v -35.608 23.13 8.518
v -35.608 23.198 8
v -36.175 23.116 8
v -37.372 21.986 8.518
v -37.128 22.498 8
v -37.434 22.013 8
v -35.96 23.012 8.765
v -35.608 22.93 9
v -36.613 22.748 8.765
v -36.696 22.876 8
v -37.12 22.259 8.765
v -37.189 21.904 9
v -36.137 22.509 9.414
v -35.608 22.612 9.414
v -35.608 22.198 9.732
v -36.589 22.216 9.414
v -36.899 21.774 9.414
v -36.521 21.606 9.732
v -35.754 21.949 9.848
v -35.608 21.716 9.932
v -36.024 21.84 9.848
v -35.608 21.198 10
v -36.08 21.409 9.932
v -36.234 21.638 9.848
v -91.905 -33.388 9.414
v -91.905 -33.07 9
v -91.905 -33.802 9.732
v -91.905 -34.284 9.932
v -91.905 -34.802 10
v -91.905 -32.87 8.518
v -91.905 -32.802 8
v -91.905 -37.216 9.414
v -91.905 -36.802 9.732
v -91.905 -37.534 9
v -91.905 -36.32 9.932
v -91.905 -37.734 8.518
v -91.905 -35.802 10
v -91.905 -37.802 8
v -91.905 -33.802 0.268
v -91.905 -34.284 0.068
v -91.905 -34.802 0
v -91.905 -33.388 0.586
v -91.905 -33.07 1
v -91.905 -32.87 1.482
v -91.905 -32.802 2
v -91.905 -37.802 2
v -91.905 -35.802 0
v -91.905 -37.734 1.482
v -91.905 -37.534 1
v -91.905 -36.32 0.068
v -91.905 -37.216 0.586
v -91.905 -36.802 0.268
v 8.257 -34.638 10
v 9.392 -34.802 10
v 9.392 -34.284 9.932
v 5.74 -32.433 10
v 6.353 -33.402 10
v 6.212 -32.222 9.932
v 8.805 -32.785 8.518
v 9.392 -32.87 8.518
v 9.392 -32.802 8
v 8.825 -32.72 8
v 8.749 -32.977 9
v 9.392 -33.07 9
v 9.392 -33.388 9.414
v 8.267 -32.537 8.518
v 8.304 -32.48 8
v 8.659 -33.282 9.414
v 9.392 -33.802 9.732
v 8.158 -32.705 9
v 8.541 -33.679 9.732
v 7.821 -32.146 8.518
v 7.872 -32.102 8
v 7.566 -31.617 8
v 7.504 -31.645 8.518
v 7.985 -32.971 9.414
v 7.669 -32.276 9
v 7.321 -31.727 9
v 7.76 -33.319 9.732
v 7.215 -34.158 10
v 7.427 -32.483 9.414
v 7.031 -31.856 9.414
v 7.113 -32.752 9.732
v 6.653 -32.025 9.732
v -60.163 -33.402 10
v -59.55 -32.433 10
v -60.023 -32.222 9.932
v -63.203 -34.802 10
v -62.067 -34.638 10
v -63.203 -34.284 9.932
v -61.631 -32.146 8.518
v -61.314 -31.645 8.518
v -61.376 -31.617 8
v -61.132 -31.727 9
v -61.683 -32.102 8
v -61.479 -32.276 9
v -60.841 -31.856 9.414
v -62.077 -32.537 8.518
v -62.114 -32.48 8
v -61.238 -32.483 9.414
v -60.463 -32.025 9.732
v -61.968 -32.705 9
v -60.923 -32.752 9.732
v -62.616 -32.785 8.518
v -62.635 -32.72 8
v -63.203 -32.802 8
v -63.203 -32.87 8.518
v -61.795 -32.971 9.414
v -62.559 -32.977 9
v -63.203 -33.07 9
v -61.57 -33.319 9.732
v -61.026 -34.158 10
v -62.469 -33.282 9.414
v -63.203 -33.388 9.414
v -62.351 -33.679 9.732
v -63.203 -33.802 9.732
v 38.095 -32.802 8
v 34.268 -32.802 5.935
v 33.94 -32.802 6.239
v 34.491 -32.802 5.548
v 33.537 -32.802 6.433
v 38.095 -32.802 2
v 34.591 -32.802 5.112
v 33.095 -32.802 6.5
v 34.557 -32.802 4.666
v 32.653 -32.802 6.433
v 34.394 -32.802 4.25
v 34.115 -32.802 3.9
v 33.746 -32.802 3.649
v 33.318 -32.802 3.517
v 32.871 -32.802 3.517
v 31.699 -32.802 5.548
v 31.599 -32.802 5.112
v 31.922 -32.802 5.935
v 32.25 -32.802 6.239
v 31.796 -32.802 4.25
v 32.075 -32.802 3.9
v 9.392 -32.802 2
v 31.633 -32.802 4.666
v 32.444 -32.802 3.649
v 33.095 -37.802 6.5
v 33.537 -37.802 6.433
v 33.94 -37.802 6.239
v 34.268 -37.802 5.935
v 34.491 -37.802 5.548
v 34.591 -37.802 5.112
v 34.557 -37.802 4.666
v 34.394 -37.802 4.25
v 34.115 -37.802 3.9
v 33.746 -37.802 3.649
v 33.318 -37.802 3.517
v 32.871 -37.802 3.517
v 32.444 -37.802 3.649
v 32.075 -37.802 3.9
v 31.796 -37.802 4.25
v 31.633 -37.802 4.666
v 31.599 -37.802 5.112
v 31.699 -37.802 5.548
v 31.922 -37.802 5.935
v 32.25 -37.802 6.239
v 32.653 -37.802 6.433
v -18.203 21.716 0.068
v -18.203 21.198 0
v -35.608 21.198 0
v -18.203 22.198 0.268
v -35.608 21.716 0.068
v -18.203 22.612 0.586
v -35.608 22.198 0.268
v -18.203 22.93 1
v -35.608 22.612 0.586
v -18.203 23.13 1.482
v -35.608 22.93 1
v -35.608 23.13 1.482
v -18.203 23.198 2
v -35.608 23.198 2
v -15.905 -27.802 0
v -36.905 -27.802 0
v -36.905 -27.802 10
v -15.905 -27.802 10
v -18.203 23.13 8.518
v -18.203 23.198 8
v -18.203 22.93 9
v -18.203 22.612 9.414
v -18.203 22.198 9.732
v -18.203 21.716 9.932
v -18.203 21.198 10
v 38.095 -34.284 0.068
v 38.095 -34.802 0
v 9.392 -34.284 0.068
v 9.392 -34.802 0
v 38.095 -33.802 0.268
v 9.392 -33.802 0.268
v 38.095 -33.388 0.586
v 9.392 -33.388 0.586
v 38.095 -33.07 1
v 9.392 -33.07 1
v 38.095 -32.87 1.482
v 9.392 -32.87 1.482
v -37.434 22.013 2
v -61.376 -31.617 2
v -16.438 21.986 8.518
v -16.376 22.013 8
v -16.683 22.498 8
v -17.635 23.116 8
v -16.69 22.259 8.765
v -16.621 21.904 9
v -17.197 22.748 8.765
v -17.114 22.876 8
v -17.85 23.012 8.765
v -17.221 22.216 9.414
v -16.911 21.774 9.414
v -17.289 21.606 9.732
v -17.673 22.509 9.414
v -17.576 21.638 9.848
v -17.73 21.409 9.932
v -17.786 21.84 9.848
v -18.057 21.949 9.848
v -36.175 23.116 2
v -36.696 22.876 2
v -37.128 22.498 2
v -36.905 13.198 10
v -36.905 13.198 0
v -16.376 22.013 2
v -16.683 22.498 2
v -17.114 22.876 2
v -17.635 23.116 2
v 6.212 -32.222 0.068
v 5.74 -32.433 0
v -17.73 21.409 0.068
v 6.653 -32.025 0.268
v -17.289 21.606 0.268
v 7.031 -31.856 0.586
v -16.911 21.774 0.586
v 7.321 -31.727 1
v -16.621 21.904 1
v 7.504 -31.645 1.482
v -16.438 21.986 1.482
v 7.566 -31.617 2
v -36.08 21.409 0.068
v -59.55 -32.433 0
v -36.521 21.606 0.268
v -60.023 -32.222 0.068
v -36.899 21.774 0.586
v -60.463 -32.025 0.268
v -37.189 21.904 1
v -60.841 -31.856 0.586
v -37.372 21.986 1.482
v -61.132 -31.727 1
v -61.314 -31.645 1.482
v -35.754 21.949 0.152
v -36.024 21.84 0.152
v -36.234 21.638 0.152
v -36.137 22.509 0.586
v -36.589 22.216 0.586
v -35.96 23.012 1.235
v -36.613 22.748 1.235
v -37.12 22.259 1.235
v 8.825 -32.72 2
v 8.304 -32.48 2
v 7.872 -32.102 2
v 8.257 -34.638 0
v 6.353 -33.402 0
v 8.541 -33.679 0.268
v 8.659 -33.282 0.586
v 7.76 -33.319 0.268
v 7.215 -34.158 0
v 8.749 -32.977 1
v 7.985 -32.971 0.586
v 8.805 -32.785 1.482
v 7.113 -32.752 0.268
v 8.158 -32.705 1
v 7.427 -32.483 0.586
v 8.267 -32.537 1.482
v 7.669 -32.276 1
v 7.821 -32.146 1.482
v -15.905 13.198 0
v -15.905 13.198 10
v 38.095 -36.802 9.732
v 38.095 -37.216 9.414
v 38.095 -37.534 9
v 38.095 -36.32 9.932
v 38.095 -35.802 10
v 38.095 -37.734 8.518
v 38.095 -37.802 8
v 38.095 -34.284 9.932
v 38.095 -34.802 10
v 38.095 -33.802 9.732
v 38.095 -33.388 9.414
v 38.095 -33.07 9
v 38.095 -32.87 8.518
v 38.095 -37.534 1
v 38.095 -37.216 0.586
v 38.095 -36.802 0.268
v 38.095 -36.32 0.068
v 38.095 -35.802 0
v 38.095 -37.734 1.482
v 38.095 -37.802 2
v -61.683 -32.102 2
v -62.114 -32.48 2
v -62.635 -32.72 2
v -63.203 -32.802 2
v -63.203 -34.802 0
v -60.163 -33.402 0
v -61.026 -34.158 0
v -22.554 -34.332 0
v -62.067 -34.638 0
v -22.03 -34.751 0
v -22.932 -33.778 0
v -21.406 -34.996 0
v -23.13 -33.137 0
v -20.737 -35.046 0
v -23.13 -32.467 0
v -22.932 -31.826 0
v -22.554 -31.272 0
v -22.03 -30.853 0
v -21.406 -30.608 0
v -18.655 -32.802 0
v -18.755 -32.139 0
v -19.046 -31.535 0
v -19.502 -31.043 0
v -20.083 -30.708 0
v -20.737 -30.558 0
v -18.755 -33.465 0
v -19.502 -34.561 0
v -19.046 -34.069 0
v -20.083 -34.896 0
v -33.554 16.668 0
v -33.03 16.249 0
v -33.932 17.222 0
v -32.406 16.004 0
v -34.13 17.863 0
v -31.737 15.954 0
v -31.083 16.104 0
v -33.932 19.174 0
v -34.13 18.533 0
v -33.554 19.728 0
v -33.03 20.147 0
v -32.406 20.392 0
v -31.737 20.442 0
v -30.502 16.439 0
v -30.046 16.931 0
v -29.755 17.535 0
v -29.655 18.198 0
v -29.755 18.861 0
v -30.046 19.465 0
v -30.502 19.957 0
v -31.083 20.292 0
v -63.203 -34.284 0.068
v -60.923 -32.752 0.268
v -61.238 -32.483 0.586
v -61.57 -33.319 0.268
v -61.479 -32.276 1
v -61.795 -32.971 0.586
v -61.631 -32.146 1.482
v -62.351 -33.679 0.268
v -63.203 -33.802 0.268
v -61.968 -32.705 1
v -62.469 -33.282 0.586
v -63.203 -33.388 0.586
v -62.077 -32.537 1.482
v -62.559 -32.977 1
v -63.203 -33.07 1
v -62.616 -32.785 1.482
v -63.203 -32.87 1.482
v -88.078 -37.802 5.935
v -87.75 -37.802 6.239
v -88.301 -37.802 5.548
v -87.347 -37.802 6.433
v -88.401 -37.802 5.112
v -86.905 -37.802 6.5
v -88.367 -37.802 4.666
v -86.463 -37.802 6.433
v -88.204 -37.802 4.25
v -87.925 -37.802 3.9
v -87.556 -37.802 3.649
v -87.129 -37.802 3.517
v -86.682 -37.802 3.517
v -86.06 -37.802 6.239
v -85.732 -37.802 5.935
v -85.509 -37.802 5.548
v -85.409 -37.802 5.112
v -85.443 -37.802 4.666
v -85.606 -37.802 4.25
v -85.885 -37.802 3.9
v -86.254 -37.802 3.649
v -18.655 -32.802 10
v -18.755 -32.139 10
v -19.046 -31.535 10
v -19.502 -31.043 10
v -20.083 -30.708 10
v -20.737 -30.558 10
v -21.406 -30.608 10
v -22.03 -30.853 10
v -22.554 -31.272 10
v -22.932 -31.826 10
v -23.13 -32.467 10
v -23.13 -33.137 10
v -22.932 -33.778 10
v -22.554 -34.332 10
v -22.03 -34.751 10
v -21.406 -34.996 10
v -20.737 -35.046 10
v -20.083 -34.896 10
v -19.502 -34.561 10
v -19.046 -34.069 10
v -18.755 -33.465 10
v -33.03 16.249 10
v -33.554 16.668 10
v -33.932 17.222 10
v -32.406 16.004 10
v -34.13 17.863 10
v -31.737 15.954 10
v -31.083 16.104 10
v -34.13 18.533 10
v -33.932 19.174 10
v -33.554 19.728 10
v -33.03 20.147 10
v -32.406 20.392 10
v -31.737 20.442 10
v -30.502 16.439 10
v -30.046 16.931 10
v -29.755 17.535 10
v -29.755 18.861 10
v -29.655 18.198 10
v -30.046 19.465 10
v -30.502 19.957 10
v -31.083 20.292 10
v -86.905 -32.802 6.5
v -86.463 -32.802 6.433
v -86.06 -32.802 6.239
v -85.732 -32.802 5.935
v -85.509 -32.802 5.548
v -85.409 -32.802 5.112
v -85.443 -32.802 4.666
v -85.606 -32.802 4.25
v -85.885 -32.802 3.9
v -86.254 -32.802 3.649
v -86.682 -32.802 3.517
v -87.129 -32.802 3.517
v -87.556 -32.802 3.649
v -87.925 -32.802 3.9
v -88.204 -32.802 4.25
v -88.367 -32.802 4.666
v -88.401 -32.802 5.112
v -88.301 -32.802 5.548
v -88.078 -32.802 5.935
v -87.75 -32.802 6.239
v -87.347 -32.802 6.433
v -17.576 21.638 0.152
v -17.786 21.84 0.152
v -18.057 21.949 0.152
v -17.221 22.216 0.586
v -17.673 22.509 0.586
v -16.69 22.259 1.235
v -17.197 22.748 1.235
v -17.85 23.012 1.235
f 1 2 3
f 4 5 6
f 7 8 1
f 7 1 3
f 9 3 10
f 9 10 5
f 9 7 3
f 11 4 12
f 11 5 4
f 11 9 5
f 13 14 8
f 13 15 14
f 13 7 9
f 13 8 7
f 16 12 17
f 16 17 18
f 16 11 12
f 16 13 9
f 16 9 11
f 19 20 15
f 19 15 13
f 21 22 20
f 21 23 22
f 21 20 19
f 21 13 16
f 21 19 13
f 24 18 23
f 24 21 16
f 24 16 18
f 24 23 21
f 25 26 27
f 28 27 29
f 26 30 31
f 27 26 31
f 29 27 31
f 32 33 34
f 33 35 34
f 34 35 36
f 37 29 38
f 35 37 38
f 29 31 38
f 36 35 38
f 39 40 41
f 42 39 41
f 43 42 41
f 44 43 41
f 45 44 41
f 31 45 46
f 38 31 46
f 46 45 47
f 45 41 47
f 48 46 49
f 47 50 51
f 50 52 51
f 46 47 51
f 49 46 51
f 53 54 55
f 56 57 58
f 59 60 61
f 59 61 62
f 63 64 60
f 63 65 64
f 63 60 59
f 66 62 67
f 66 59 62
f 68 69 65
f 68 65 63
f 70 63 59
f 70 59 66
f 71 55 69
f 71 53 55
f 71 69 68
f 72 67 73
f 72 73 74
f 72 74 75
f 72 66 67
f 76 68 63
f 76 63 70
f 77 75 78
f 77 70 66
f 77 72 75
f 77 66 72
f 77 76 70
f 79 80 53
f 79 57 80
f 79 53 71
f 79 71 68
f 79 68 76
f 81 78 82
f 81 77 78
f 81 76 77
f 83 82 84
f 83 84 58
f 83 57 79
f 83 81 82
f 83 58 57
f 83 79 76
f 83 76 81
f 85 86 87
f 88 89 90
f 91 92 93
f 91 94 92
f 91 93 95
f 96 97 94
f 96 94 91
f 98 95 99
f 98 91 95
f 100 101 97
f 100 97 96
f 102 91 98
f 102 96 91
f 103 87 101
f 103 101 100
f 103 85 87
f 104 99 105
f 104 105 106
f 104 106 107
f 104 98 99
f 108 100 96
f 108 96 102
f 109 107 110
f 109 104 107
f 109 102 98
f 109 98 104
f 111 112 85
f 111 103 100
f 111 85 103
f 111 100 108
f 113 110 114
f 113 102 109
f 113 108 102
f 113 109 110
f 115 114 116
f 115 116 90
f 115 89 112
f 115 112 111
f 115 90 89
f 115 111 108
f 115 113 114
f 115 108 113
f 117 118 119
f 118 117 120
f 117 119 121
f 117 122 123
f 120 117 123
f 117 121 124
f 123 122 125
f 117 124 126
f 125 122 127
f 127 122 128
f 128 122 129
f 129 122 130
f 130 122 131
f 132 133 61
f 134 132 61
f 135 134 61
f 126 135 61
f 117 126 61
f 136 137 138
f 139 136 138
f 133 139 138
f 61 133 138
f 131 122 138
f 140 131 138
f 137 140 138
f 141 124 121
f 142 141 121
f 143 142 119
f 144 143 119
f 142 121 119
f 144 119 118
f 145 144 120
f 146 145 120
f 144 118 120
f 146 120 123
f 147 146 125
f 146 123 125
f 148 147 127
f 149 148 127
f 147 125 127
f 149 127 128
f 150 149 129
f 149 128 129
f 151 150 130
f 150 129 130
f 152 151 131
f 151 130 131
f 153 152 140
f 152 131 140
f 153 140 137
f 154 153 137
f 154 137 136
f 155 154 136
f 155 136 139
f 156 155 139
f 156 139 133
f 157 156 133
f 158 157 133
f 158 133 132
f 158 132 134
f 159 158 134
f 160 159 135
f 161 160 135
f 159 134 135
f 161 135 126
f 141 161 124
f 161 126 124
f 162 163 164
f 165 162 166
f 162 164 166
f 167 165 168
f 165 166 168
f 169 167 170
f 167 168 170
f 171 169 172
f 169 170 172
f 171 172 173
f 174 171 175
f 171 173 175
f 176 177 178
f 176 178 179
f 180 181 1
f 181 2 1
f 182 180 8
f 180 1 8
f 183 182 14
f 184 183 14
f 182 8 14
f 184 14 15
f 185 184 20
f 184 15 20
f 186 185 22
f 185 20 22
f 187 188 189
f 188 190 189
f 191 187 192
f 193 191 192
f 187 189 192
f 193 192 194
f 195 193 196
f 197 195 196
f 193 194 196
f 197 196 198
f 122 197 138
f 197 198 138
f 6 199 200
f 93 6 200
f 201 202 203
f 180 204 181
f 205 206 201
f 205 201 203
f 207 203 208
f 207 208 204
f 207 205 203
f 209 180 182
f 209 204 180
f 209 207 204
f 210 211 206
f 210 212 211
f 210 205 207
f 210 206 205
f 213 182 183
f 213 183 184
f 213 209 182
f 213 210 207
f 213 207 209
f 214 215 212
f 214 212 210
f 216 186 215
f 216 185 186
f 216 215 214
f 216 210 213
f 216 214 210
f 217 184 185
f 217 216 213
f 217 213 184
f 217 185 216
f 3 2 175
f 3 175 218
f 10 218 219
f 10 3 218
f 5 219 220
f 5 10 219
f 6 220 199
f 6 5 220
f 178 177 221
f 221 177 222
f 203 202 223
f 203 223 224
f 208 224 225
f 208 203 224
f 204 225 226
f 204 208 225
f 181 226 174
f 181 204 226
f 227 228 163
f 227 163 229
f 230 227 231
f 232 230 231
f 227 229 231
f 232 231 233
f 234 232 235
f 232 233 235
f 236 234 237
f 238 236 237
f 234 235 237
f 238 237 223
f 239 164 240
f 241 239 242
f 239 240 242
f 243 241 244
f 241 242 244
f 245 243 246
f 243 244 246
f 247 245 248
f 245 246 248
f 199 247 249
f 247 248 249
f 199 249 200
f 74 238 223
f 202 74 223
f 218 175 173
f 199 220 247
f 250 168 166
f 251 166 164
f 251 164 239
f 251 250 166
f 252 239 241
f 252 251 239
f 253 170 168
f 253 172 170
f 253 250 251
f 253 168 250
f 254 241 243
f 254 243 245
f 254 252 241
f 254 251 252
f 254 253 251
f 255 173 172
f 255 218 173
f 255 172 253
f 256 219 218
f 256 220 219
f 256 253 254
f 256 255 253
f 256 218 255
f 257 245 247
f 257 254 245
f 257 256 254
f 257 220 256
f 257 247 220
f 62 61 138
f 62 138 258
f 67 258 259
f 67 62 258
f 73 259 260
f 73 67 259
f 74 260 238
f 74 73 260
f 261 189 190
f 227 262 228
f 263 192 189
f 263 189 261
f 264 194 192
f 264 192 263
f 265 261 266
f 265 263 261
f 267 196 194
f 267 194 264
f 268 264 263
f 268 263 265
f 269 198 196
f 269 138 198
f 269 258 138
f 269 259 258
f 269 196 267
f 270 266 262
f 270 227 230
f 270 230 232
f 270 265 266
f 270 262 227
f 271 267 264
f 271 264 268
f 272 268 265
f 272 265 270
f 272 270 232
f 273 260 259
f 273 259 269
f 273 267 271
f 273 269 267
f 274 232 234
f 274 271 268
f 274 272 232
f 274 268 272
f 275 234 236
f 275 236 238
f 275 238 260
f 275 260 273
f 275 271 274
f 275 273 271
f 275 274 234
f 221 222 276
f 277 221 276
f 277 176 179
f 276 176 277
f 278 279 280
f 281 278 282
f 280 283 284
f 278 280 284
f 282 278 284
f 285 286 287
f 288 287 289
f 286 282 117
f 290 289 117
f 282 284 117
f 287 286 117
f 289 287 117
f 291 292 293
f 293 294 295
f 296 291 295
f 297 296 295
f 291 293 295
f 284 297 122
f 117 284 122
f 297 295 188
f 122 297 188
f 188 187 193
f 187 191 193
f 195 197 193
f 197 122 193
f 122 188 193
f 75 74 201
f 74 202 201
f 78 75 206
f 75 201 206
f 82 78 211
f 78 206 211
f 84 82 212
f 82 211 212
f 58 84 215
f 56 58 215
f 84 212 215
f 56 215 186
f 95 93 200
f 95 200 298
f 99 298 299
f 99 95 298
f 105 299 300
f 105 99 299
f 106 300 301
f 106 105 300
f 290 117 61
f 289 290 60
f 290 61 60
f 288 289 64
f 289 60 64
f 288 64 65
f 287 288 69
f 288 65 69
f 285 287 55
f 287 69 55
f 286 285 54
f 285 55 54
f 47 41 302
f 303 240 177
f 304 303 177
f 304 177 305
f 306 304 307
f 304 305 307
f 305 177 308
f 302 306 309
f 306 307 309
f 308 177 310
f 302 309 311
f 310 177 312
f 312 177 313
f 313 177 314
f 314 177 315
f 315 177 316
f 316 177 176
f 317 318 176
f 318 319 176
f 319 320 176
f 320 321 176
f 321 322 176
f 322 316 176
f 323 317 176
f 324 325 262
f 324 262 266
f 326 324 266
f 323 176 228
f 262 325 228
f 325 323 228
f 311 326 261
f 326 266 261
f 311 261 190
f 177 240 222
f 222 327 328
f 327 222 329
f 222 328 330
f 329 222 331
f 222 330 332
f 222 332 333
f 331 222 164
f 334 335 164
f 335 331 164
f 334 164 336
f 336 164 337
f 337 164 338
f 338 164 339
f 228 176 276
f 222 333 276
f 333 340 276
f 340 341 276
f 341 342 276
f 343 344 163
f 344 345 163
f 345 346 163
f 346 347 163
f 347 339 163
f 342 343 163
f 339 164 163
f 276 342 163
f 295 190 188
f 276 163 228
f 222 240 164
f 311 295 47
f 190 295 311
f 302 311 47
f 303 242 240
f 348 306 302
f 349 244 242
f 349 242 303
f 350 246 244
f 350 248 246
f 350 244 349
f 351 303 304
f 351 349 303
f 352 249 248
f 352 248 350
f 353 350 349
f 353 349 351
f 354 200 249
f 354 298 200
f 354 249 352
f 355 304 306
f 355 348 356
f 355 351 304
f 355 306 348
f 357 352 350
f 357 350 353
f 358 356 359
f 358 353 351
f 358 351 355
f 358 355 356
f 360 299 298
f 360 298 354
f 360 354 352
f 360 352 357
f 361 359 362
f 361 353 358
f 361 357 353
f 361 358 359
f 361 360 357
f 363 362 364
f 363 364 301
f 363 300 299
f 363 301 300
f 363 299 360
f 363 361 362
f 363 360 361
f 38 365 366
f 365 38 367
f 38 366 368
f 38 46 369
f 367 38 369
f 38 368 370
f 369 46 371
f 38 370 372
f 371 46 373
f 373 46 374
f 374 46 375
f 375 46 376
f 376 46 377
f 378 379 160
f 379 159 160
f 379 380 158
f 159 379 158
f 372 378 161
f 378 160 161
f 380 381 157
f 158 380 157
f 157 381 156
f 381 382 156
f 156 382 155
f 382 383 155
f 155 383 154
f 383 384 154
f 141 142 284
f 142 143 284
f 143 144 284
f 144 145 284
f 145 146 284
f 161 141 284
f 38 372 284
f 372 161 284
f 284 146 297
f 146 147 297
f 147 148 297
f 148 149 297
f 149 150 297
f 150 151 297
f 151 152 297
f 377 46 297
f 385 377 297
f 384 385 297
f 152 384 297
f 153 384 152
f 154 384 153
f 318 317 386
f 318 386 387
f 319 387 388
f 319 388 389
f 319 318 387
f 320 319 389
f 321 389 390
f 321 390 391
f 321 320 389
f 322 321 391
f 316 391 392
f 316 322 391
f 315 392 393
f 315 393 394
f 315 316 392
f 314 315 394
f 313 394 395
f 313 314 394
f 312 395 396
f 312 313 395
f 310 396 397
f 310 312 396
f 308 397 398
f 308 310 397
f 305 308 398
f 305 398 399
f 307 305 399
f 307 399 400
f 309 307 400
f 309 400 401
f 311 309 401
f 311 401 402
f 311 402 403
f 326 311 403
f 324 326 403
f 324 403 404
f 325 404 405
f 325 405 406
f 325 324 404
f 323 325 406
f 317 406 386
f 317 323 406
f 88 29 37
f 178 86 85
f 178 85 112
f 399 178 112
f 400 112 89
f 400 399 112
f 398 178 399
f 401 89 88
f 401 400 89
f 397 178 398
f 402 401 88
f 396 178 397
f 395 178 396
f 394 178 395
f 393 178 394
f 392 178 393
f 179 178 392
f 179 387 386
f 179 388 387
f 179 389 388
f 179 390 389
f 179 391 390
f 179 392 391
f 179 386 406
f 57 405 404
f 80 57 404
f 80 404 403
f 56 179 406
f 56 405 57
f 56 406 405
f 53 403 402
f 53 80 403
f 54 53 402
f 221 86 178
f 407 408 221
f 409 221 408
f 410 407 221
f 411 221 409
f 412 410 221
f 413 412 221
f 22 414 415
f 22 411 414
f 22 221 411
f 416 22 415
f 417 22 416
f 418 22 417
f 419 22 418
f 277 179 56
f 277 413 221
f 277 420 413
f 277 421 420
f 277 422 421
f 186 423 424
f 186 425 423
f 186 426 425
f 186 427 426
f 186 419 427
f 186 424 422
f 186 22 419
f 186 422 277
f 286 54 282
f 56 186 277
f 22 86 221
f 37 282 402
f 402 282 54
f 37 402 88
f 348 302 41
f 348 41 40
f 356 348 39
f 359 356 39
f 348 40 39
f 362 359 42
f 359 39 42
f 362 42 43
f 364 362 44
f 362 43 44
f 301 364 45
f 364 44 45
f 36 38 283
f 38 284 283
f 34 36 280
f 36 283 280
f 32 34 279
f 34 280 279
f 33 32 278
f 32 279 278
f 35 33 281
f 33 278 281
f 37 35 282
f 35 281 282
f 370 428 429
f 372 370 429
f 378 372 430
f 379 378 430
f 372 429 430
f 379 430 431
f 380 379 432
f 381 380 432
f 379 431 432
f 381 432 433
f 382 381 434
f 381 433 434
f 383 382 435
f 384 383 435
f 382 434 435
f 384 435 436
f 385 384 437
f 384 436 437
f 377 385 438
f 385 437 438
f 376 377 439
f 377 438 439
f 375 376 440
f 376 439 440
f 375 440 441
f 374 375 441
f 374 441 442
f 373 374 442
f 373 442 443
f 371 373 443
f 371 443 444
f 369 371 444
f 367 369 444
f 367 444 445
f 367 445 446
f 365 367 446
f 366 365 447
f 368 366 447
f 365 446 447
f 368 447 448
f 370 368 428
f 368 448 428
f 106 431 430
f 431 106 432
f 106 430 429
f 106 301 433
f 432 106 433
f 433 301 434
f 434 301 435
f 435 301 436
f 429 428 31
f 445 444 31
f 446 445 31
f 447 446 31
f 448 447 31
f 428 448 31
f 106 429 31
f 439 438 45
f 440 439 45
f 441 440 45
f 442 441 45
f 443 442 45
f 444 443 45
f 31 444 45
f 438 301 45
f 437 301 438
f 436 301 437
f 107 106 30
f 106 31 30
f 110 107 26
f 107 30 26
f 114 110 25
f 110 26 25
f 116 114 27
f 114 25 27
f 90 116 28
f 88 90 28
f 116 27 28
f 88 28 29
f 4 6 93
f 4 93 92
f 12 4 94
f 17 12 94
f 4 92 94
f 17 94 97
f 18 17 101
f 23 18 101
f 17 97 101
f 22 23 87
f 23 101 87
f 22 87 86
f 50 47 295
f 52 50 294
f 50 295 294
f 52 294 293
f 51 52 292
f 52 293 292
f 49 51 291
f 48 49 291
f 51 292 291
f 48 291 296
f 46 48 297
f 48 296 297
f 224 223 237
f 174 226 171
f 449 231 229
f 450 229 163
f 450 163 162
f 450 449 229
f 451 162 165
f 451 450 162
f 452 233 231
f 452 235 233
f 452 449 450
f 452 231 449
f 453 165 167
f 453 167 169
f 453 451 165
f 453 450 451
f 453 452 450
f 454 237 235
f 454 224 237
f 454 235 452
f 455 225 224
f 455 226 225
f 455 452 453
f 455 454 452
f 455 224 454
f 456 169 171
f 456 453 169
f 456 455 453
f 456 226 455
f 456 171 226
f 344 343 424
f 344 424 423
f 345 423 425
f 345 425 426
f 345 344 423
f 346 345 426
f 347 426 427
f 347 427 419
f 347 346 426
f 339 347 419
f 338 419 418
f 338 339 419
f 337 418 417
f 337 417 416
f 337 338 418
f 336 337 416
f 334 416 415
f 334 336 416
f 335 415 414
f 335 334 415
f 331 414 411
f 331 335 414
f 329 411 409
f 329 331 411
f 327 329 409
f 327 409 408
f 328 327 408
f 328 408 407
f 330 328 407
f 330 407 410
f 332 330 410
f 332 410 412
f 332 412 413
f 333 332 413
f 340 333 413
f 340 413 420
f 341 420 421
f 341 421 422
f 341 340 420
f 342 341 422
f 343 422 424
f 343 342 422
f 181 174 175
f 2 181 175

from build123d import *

# Parameters (mm, degrees)
SKETCH1_W           = 21
SKETCH1_H           = 41
BOSS_EXTRUDE1_DEPTH = 10
SKETCH1_3_R         = 2.25
CUT_EXTRUDE1_DEPTH  = 10
SKETCH2_R           = 1.5
CUT_EXTRUDE2_DEPTH  = 5
FILLET1_R           = 2
FILLET2_R           = 2


with BuildPart() as part:
    # Sketch1 → Boss-Extrude1 (new body)
    with BuildSketch(Plane.XY):
        Polygon((8.094892468, -32.802015288), (-16.905107532, 23.197984712), (-36.905107532, 23.197984712), (-61.905107532, -32.802015288), (-91.905107532, -32.802015288), (-91.905107532, -37.802015288), (38.094892468, -37.802015288), (38.094892468, -32.802015288), align=None)
        with Locations((-26.405107532, -7.302015288)):
            Rectangle(SKETCH1_W, SKETCH1_H, mode=Mode.SUBTRACT)
    extrude(amount=BOSS_EXTRUDE1_DEPTH)

    # Sketch1<3> → Cut-Extrude1 (cut)
    with BuildSketch(Plane.XY):
        with Locations((-31.905107532, 18.197984712)):
            Circle(SKETCH1_3_R)
        with Locations((-20.905107532, -32.802015288)):
            Circle(SKETCH1_3_R)
    extrude(amount=CUT_EXTRUDE1_DEPTH, mode=Mode.SUBTRACT)

    # Sketch2 → Cut-Extrude2 (cut)
    with BuildSketch(Plane(origin=(0, -32.802015288, 0), x_dir=(1, 0, 0), z_dir=(0, 1, 0))):
        with Locations((33.094892468, -5)):
            Circle(SKETCH2_R)
        with Locations((-86.905107532, -5)):
            Circle(SKETCH2_R)
    extrude(amount=-CUT_EXTRUDE2_DEPTH, mode=Mode.SUBTRACT)

    # Fillet1
    fillet1_edges = [part.edges().sort_by_distance(p)[0] for p in [
        (-61.905107532, -32.802015288, 5),
        (8.094892468, -32.802015288, 5),
        (-36.905107532, 23.197984712, 5),
        (-16.905107532, 23.197984712, 5),
    ]]
    fillet(fillet1_edges, radius=FILLET1_R)

    # Fillet2
    fillet2_edges = [part.edges().sort_by_distance(p)[0] for p in [
        (23.743588762, -32.802015288, 0),
        (8.303846577, -32.479901363, 0),
        (-77.553803825, -32.802015288, 0),
        (-62.114061641, -32.479901363, 0),
        (-49.405107532, -4.802015288, 0),
        (-36.696153423, 22.875870787, 0),
        (-26.905107532, 23.197984712, 0),
        (-17.114061641, 22.875870787, 0),
        (23.743588762, -32.802015288, 10),
        (8.303846577, -32.479901363, 10),
        (-77.553803825, -32.802015288, 10),
        (-62.114061641, -32.479901363, 10),
        (-49.405107532, -4.802015288, 10),
        (-36.696153423, 22.875870787, 10),
        (-26.905107532, 23.197984712, 10),
        (-17.114061641, 22.875870787, 10),
        (-26.905107532, -37.802015288, 10),
        (-26.905107532, -37.802015288, 0),
        (-4.405107532, -4.802015288, 0),
        (-4.405107532, -4.802015288, 10),
    ]]
    fillet(fillet2_edges, radius=FILLET2_R)


solid = part.part
